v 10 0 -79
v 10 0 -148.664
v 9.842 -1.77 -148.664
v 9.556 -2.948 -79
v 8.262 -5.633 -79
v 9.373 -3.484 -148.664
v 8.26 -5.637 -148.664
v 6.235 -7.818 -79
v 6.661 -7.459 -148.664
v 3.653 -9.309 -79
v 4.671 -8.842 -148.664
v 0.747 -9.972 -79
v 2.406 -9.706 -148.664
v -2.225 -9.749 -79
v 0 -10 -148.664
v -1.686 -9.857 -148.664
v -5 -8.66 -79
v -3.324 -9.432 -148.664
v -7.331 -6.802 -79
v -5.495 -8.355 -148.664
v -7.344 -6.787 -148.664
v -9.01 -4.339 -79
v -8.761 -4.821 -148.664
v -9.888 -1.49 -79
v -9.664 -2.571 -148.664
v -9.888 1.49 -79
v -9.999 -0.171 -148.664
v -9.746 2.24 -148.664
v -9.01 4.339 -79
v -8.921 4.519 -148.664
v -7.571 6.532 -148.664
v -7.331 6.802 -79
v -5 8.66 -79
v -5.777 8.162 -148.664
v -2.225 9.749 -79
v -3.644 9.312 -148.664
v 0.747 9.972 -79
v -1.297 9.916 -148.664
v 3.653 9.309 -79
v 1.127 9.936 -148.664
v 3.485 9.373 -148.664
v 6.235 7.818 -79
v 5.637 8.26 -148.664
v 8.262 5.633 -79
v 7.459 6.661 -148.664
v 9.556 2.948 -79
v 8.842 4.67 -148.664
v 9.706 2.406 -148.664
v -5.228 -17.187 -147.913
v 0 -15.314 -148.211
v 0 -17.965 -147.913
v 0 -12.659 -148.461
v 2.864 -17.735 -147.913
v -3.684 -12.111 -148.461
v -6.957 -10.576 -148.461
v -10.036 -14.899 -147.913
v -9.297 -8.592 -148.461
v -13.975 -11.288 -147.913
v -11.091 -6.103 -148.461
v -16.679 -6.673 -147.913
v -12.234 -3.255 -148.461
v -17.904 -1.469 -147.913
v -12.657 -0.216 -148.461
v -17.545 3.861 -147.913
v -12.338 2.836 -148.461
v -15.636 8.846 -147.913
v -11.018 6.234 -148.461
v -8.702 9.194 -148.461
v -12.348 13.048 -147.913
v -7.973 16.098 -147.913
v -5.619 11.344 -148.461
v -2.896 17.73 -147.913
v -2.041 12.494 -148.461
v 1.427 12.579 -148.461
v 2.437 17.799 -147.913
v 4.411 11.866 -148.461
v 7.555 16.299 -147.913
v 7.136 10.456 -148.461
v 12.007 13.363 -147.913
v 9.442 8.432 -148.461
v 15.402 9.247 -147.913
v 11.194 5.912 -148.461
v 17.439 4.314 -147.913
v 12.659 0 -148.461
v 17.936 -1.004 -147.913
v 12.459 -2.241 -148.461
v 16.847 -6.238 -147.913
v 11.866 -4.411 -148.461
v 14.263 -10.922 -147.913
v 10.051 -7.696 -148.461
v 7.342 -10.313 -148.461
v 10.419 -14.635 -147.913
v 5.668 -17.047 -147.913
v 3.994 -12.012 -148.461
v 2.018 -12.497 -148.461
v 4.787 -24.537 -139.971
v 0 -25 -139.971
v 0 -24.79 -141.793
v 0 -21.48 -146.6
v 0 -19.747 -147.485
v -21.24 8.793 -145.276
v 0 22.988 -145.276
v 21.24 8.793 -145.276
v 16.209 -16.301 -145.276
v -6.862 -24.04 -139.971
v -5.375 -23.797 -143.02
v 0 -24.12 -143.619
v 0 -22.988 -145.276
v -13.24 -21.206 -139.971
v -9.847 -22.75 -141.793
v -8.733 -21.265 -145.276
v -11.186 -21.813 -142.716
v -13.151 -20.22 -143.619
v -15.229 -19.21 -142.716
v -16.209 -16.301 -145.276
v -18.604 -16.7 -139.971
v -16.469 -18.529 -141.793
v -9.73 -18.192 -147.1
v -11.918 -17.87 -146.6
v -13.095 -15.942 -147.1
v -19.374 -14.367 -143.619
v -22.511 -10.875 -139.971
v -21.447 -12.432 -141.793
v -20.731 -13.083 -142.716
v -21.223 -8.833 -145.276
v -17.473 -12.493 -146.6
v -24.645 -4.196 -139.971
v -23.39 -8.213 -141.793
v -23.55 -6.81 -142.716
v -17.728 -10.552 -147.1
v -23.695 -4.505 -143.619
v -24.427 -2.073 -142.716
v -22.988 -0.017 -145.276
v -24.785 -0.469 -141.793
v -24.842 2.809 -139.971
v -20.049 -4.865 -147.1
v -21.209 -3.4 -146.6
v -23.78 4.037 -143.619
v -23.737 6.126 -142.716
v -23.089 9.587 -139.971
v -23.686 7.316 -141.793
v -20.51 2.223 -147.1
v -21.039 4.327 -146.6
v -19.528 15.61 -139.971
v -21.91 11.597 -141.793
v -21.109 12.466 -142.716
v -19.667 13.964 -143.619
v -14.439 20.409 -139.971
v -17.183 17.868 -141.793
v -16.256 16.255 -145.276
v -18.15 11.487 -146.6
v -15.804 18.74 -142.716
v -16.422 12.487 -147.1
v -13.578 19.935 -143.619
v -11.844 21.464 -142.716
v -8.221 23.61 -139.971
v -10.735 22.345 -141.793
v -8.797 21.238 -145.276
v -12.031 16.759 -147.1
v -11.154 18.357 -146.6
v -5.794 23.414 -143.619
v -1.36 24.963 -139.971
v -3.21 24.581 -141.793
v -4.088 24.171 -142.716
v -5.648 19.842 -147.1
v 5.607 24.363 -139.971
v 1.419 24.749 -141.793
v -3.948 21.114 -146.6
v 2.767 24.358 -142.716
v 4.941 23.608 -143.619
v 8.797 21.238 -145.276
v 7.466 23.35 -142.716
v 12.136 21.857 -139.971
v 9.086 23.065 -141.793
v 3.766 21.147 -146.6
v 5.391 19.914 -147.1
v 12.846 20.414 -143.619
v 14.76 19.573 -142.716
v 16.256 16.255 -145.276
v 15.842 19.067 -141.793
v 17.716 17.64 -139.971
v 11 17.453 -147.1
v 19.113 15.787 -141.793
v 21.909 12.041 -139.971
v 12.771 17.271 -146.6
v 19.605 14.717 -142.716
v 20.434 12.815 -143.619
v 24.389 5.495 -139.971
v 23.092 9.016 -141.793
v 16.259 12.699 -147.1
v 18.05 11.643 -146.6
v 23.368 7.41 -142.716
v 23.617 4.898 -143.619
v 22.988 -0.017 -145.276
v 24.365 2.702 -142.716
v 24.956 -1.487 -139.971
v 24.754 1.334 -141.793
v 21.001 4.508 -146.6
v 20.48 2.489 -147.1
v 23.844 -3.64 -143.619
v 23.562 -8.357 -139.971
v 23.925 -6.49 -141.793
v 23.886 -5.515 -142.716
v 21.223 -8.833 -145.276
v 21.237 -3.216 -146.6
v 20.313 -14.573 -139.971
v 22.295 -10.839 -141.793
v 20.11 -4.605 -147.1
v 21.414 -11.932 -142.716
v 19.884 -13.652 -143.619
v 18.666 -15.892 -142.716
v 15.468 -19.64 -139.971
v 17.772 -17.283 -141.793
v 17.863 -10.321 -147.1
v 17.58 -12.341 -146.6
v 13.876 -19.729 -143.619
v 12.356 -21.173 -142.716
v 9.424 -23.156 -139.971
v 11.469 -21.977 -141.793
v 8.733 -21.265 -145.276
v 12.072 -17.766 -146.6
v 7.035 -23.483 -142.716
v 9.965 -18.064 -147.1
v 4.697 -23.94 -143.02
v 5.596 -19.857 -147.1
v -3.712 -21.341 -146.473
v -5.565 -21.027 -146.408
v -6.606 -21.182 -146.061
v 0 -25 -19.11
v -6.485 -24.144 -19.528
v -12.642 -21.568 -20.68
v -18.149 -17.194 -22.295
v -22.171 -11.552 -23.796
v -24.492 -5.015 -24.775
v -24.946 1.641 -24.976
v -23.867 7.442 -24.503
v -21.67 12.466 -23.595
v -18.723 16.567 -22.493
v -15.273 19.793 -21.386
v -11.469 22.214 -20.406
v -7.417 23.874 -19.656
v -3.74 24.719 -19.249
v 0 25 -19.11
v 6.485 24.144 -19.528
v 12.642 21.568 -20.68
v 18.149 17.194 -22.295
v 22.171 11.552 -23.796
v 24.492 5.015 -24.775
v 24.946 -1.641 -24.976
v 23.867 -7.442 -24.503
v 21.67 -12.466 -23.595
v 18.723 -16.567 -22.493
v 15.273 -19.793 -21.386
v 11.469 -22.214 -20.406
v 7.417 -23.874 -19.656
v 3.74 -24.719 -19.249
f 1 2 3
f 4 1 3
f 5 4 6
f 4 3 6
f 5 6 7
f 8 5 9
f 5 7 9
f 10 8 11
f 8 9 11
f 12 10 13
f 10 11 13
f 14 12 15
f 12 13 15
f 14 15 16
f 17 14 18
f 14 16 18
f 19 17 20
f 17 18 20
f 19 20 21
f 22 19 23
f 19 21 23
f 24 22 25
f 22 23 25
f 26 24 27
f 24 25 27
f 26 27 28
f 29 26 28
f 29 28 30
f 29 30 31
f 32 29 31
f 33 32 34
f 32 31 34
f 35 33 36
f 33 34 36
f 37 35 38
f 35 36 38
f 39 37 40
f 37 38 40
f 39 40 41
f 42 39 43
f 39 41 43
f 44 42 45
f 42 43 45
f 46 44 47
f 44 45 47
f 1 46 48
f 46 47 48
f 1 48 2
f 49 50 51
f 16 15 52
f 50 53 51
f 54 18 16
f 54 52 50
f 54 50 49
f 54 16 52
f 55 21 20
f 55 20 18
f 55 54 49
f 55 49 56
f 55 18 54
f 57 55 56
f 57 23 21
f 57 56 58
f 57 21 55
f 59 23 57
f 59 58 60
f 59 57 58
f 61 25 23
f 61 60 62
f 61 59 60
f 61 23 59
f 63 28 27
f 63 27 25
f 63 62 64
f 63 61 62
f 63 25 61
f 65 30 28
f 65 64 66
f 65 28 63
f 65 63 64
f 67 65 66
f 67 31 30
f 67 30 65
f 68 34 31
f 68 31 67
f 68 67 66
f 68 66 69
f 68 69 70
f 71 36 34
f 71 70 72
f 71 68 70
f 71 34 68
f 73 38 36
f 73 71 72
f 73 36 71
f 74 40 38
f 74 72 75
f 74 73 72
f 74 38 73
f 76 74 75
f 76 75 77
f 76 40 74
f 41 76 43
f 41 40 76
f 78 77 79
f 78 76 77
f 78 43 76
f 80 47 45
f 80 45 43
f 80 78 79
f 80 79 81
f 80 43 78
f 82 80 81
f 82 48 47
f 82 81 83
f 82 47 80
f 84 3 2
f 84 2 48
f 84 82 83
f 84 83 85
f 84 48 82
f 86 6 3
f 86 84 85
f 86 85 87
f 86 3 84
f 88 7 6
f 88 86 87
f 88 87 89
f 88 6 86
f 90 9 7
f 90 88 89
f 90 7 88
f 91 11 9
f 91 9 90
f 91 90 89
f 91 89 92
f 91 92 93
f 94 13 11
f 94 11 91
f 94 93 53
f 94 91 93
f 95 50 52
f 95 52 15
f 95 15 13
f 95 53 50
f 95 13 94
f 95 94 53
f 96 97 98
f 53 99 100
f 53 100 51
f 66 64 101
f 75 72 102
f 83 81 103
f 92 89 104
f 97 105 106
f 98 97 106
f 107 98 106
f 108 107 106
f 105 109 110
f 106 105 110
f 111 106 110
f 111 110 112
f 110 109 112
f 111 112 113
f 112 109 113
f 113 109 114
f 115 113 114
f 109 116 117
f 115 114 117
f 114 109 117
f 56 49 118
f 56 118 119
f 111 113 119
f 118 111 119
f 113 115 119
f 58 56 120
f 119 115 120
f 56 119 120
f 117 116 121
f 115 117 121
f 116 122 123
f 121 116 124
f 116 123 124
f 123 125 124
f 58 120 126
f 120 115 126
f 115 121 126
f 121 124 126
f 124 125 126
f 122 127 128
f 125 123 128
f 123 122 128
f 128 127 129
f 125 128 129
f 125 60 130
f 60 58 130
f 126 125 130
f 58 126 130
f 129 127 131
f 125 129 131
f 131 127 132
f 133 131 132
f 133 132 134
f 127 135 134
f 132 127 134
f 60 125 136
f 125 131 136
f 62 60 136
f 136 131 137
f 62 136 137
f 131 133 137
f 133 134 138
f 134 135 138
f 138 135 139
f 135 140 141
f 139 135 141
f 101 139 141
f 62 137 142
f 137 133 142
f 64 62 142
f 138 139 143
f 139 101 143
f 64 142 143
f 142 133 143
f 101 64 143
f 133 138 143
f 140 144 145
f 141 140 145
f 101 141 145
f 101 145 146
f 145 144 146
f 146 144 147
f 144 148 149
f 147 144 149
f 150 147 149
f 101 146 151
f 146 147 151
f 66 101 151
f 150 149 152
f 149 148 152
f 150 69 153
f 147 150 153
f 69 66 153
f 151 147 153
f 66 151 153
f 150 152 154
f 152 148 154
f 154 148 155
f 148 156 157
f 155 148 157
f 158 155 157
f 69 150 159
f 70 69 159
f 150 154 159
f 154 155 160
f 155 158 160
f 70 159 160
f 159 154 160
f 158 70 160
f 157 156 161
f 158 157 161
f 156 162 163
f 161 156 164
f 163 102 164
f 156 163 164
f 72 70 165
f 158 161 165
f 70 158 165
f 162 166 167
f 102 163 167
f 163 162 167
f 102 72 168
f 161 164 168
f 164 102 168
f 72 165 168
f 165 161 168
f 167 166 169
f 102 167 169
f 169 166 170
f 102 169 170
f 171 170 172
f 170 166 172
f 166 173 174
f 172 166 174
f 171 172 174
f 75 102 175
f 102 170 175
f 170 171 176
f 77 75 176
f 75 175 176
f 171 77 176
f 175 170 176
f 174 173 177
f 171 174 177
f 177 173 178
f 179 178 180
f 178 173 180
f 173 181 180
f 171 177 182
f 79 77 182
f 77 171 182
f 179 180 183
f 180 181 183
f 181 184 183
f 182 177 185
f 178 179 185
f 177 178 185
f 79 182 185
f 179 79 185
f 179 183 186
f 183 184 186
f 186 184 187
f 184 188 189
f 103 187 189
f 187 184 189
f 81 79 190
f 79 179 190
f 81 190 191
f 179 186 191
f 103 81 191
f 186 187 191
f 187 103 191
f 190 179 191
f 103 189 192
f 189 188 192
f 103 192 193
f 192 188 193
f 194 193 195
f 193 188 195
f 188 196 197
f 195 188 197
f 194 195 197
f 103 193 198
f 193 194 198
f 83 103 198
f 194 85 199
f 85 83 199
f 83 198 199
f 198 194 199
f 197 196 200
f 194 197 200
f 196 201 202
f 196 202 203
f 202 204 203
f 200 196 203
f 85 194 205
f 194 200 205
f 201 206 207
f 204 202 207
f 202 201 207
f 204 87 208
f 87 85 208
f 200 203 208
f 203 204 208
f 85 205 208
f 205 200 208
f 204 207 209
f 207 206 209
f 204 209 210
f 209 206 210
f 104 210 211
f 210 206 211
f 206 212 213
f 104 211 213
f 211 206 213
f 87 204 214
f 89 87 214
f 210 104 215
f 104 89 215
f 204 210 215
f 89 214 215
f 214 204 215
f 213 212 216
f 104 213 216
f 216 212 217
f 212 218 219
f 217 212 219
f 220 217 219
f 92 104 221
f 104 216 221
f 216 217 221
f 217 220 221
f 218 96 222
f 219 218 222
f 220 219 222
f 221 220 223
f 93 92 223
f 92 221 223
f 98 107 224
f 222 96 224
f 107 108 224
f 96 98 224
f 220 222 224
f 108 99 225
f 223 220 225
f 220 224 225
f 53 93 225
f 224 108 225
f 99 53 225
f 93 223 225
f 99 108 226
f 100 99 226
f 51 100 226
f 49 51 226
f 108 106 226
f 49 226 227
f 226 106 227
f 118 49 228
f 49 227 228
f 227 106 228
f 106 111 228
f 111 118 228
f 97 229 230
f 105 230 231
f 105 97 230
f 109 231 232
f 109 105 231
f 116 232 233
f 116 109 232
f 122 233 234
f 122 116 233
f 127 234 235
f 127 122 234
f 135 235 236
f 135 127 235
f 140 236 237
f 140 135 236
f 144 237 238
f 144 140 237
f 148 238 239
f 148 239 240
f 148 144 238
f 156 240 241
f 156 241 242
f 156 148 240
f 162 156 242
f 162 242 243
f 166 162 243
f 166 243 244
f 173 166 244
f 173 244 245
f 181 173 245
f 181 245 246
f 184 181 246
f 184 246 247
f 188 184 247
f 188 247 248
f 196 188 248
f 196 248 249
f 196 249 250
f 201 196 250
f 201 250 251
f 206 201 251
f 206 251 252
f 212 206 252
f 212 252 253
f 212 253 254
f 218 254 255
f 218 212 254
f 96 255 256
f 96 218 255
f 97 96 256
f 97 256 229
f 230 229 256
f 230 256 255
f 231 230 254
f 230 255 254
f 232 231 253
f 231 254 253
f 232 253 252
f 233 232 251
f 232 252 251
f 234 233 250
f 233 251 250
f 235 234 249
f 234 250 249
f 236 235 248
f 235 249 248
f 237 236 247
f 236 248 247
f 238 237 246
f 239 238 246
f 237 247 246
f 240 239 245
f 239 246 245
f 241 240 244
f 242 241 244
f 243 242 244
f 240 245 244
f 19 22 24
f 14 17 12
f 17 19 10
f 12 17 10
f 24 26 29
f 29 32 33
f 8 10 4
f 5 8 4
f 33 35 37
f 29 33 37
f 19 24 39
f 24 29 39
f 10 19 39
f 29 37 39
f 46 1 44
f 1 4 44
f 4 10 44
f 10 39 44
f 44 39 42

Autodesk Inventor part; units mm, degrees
ref_plane "YZ Plane" through (0, 0, 0) normal (1, 0, 0) x (0, 1, 0)
ref_plane "XZ Plane" through (0, 0, 0) normal (0, 1, 0) x (-1, 0, 0)
sketch "Sketch1" plane through (0, 0, 0) normal (1, 0, 0) x (0, 1, 0)
  circle A0 centre (0, 0) radius 25
  arc A1 (-25, -19.1099) -> (25, -19.1099) centre (0, 31) ccw
  line L0 (0, 31) -> (0, 0) construction
  circle A2 centre (0, 0) radius 149 construction
  line L1 (-25, 0) -> (-25, -149)
  line L2 (-25, -149) -> (25, -149)
  line L3 (25, -149) -> (25, 0)
  line L4 (-25, -149) -> (-40, -149)
  line L5 (-40, -149) -> (-40, -143.5305)
  arc A3 (-40, -143.5305) -> (0, -149) centre (0, 0) ccw
  line L6 (0, 0) -> (0, -149)
  line L7 (-25, 0) -> (25, 0)
  point P0 (0, -25)
  point P1 (-25, -146.8877)
  dimension "d2" = 298
  dimension "d0" = 50
  dimension "d1" = 112
  dimension "d3" = 40
sketch "Sketch2" plane through (0, 0, 0) normal (0, 0, 1) x (1, 0, 0)
  circle A0 centre (0, 0) radius 10
  dimension "d7" = 20
revolve "Revolution1" add sketch "Sketch1" angle 360 about axis through (0, 0, 0) along (0, 0, -1) picked at (-1.8543, -16.4577) contours L7 L6 A0 | A0 A1 L1 | L6 A3 L1 A1
extrude "Extrusion1" cut sketch "Sketch1" against normal through all both and the other way through all contours L7 A0 | L3 A1 A0 | A0 L6 L7 | L7 L6 A0 | A0 A1 L1
ref_plane "Work Plane1" through (0, 0, -149) normal (0, 0, 1) x (1, 0, 0)
extrude "Extrusion2" cut sketch "Sketch2" along normal blind 70 from surface at -149
fillet "Fillet1" radius 8 1 edges at (0, 25, -146.8877)
properties part number "shank"
